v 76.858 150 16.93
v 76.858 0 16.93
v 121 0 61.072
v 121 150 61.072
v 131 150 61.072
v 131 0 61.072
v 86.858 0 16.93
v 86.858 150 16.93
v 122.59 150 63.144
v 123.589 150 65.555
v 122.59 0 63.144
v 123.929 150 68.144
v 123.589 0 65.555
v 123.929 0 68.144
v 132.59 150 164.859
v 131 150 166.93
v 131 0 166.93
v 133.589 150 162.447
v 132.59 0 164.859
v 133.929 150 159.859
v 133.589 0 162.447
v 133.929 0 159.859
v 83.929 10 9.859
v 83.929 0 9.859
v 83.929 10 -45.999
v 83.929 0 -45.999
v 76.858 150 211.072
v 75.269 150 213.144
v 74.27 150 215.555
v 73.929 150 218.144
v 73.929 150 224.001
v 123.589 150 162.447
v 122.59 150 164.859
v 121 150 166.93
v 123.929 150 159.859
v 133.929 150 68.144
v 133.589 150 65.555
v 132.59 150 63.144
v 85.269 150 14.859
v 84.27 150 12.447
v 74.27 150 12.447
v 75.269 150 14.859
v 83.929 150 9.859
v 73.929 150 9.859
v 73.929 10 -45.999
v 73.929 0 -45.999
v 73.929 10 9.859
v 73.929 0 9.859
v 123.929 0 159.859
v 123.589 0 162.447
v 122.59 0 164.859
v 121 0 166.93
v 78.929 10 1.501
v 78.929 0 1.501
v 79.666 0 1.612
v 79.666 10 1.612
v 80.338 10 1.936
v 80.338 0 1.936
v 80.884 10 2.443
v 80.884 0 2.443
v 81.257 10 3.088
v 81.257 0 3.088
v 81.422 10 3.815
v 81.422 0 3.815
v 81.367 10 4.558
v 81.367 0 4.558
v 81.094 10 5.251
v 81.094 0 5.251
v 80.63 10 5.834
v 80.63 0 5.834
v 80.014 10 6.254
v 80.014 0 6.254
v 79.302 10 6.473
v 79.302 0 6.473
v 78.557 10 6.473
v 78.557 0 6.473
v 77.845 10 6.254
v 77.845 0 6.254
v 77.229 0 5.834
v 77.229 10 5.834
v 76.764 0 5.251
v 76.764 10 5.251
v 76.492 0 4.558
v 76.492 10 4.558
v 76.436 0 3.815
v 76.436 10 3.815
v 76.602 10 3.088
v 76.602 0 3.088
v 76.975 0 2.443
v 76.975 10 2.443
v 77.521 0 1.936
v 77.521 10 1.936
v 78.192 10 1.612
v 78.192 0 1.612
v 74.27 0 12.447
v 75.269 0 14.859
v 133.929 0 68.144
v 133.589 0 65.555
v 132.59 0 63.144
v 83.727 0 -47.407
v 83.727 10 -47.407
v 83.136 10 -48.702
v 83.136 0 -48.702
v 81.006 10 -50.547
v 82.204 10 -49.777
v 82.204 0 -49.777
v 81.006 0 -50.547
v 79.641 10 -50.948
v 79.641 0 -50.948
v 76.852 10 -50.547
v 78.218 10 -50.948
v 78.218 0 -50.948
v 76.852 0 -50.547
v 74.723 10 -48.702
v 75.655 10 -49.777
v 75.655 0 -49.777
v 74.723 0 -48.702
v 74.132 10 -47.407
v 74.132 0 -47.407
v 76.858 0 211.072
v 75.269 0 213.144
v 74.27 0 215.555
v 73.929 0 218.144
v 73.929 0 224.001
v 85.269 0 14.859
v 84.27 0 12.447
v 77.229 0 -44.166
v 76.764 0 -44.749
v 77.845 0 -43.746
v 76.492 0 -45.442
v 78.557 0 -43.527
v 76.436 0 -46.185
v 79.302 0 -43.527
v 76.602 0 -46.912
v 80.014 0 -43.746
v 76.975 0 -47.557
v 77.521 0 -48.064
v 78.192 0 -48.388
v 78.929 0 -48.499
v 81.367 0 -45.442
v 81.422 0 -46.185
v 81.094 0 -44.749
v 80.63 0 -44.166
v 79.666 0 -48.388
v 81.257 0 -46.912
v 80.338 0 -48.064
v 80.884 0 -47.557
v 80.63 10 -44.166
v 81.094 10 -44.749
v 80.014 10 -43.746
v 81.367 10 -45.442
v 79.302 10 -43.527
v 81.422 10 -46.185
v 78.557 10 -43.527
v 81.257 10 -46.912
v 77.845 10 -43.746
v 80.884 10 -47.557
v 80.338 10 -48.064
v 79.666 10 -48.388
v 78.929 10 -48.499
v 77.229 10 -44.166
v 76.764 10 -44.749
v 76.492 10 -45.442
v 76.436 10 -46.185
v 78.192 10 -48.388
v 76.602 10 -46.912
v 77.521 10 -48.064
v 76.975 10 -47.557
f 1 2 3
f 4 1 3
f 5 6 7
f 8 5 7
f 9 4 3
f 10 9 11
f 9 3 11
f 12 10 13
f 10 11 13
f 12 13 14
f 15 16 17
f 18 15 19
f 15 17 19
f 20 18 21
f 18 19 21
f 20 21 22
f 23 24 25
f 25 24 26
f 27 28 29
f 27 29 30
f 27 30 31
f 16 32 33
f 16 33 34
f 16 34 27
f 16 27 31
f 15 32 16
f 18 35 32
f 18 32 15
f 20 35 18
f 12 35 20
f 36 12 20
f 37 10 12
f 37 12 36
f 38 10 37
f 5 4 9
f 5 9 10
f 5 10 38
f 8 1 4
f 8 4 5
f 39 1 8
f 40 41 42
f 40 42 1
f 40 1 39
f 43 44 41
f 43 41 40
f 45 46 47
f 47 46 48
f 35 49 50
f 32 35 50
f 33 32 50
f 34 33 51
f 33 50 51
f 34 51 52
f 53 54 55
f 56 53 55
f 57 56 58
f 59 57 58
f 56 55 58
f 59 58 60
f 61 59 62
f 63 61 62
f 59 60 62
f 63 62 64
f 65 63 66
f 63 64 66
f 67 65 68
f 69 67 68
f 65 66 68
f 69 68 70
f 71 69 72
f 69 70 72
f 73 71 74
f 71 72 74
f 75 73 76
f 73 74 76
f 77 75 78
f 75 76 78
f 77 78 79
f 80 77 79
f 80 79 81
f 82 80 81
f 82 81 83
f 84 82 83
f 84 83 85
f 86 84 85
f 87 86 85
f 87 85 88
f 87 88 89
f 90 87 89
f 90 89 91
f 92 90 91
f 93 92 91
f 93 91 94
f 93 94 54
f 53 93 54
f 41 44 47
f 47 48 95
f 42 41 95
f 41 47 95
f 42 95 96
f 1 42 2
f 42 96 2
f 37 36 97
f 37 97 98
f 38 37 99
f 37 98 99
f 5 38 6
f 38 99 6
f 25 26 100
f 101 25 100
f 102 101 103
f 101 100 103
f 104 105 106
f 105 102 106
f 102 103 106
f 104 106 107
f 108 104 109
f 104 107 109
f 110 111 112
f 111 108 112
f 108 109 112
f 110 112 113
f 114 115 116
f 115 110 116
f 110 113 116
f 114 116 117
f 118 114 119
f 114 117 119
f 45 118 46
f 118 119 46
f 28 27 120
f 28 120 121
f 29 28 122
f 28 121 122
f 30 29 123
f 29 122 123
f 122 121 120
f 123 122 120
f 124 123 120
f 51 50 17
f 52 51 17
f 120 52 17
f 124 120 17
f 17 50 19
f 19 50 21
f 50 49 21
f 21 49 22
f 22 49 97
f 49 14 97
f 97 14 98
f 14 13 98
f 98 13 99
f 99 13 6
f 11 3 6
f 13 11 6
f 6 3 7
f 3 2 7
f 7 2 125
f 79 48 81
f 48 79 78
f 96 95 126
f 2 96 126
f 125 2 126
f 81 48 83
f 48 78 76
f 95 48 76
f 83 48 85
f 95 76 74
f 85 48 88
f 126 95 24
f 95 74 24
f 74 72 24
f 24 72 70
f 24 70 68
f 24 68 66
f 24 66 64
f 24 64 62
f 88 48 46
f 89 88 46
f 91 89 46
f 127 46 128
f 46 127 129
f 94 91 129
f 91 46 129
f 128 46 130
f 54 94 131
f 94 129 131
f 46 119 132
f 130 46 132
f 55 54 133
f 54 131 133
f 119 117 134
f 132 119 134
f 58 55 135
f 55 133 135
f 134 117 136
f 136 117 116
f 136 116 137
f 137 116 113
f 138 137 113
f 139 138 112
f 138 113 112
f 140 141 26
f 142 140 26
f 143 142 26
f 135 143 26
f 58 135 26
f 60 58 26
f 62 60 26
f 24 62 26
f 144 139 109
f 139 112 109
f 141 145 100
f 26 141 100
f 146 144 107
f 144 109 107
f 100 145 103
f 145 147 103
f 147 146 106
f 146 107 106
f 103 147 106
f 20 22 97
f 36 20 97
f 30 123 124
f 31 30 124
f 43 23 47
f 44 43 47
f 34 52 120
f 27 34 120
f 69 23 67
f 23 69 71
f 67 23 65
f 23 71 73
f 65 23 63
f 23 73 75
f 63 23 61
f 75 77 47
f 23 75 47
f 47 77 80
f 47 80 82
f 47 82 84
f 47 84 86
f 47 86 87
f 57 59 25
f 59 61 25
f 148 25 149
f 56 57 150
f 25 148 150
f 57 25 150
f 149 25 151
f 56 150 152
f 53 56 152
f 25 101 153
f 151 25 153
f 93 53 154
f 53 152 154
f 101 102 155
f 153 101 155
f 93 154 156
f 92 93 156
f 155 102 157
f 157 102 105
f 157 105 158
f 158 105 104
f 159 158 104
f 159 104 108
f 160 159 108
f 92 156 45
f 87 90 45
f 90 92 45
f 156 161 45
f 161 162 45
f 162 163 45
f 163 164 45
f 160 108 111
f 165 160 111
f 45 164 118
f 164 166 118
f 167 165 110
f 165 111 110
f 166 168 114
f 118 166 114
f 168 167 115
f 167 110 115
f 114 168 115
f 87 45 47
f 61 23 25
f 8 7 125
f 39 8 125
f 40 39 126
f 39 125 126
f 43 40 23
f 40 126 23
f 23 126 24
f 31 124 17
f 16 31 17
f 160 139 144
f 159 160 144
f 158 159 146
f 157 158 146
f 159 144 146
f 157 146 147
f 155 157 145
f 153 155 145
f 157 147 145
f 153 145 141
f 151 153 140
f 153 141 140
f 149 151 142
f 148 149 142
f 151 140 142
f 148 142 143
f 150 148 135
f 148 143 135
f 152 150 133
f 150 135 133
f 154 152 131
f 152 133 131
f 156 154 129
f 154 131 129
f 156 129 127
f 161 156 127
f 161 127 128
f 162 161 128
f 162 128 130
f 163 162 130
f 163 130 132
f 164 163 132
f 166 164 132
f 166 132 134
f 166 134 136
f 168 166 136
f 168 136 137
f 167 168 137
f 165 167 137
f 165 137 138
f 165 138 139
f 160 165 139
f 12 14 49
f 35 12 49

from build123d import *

# Parameters (mm, degrees)
EXTRUDE_1_DEPTH     = 150
CUT_EXTRUDE_START   = -140
CUT_EXTRUDE_1_DEPTH = 140
SKETCH_5_R          = 2.5
CUT_EXTRUDE_2_DEPTH = 302.021089881


with BuildPart() as part:
    # 草图1 → 凸台-拉伸1 (new body)
    with BuildSketch(Plane(origin=(0, 0, 0), x_dir=(1, 0, 0), z_dir=(0, 1, 0))):
        with BuildLine():
            Line((83.929371052, -4.001384199), (83.929371052, 45.998615801))
            ThreePointArc((83.929371052, 45.998615801), (78.929371052, 50.998615801), (73.929371052, 45.998615801))
            Line((73.929371052, 45.998615801), (73.929371052, -4.001384199))
            Line((73.929371052, -4.001384199), (73.929371052, -9.859248575))
            ThreePointArc((73.929371052, -9.859248575), (74.690575727, -13.686082899), (76.85830324, -16.930316387))
            Line((76.85830324, -16.930316387), (121.000438864, -61.072452011))
            ThreePointArc((121.000438864, -61.072452011), (123.168166377, -64.316685499), (123.929371052, -68.143519823))
            Line((123.929371052, -68.143519823), (123.929371052, -159.859248575))
            ThreePointArc((123.929371052, -159.859248575), (123.168166377, -163.686082899), (121.000438864, -166.930316387))
            Line((121.000438864, -166.930316387), (76.85830324, -211.072452011))
            ThreePointArc((76.85830324, -211.072452011), (74.690575727, -214.316685499), (73.929371052, -218.143519823))
            Line((73.929371052, -218.143519823), (73.929371052, -224.001384199))
            Line((73.929371052, -224.001384199), (131.000438864, -166.930316387))
            ThreePointArc((131.000438864, -166.930316387), (133.168166377, -163.686082899), (133.929371052, -159.859248575))
            Line((133.929371052, -159.859248575), (133.929371052, -68.143519823))
            ThreePointArc((133.929371052, -68.143519823), (133.168166377, -64.316685499), (131.000438864, -61.072452011))
            Line((131.000438864, -61.072452011), (86.85830324, -16.930316387))
            ThreePointArc((86.85830324, -16.930316387), (84.690575727, -13.686082899), (83.929371052, -9.859248575))
            Line((83.929371052, -9.859248575), (83.929371052, -4.001384199))
        make_face()
    extrude(amount=EXTRUDE_1_DEPTH)

    # 草图3 → 切除-拉伸1 (cut)
    with BuildSketch(Plane(origin=(0, 150, 0), x_dir=(1, 0, 0), z_dir=(0, 1, 0)).offset(CUT_EXTRUDE_START)):
        with BuildLine():
            Line((83.929371052, -9.859248575), (73.929371052, -9.859248575))
            Line((73.929371052, -9.859248575), (73.929371052, 45.998615801))
            ThreePointArc((73.929371052, 45.998615801), (78.929371052, 50.998615801), (83.929371052, 45.998615801))
            Line((83.929371052, 45.998615801), (83.929371052, -9.859248575))
        make_face()
    extrude(amount=CUT_EXTRUDE_1_DEPTH, mode=Mode.SUBTRACT)

    # 草图5 → 切除-拉伸2 (cut, through all)
    with BuildSketch(Plane.XZ):
        with Locations(Location((78.929371052, -45.998615801, 0), (0, 0, 270))):
            Circle(SKETCH_5_R)
        with Locations(Location((78.929371052, 4.001384199, 0), (0, 0, 270))):
            Circle(SKETCH_5_R)
    extrude(amount=-CUT_EXTRUDE_2_DEPTH, mode=Mode.SUBTRACT)


solid = part.part
